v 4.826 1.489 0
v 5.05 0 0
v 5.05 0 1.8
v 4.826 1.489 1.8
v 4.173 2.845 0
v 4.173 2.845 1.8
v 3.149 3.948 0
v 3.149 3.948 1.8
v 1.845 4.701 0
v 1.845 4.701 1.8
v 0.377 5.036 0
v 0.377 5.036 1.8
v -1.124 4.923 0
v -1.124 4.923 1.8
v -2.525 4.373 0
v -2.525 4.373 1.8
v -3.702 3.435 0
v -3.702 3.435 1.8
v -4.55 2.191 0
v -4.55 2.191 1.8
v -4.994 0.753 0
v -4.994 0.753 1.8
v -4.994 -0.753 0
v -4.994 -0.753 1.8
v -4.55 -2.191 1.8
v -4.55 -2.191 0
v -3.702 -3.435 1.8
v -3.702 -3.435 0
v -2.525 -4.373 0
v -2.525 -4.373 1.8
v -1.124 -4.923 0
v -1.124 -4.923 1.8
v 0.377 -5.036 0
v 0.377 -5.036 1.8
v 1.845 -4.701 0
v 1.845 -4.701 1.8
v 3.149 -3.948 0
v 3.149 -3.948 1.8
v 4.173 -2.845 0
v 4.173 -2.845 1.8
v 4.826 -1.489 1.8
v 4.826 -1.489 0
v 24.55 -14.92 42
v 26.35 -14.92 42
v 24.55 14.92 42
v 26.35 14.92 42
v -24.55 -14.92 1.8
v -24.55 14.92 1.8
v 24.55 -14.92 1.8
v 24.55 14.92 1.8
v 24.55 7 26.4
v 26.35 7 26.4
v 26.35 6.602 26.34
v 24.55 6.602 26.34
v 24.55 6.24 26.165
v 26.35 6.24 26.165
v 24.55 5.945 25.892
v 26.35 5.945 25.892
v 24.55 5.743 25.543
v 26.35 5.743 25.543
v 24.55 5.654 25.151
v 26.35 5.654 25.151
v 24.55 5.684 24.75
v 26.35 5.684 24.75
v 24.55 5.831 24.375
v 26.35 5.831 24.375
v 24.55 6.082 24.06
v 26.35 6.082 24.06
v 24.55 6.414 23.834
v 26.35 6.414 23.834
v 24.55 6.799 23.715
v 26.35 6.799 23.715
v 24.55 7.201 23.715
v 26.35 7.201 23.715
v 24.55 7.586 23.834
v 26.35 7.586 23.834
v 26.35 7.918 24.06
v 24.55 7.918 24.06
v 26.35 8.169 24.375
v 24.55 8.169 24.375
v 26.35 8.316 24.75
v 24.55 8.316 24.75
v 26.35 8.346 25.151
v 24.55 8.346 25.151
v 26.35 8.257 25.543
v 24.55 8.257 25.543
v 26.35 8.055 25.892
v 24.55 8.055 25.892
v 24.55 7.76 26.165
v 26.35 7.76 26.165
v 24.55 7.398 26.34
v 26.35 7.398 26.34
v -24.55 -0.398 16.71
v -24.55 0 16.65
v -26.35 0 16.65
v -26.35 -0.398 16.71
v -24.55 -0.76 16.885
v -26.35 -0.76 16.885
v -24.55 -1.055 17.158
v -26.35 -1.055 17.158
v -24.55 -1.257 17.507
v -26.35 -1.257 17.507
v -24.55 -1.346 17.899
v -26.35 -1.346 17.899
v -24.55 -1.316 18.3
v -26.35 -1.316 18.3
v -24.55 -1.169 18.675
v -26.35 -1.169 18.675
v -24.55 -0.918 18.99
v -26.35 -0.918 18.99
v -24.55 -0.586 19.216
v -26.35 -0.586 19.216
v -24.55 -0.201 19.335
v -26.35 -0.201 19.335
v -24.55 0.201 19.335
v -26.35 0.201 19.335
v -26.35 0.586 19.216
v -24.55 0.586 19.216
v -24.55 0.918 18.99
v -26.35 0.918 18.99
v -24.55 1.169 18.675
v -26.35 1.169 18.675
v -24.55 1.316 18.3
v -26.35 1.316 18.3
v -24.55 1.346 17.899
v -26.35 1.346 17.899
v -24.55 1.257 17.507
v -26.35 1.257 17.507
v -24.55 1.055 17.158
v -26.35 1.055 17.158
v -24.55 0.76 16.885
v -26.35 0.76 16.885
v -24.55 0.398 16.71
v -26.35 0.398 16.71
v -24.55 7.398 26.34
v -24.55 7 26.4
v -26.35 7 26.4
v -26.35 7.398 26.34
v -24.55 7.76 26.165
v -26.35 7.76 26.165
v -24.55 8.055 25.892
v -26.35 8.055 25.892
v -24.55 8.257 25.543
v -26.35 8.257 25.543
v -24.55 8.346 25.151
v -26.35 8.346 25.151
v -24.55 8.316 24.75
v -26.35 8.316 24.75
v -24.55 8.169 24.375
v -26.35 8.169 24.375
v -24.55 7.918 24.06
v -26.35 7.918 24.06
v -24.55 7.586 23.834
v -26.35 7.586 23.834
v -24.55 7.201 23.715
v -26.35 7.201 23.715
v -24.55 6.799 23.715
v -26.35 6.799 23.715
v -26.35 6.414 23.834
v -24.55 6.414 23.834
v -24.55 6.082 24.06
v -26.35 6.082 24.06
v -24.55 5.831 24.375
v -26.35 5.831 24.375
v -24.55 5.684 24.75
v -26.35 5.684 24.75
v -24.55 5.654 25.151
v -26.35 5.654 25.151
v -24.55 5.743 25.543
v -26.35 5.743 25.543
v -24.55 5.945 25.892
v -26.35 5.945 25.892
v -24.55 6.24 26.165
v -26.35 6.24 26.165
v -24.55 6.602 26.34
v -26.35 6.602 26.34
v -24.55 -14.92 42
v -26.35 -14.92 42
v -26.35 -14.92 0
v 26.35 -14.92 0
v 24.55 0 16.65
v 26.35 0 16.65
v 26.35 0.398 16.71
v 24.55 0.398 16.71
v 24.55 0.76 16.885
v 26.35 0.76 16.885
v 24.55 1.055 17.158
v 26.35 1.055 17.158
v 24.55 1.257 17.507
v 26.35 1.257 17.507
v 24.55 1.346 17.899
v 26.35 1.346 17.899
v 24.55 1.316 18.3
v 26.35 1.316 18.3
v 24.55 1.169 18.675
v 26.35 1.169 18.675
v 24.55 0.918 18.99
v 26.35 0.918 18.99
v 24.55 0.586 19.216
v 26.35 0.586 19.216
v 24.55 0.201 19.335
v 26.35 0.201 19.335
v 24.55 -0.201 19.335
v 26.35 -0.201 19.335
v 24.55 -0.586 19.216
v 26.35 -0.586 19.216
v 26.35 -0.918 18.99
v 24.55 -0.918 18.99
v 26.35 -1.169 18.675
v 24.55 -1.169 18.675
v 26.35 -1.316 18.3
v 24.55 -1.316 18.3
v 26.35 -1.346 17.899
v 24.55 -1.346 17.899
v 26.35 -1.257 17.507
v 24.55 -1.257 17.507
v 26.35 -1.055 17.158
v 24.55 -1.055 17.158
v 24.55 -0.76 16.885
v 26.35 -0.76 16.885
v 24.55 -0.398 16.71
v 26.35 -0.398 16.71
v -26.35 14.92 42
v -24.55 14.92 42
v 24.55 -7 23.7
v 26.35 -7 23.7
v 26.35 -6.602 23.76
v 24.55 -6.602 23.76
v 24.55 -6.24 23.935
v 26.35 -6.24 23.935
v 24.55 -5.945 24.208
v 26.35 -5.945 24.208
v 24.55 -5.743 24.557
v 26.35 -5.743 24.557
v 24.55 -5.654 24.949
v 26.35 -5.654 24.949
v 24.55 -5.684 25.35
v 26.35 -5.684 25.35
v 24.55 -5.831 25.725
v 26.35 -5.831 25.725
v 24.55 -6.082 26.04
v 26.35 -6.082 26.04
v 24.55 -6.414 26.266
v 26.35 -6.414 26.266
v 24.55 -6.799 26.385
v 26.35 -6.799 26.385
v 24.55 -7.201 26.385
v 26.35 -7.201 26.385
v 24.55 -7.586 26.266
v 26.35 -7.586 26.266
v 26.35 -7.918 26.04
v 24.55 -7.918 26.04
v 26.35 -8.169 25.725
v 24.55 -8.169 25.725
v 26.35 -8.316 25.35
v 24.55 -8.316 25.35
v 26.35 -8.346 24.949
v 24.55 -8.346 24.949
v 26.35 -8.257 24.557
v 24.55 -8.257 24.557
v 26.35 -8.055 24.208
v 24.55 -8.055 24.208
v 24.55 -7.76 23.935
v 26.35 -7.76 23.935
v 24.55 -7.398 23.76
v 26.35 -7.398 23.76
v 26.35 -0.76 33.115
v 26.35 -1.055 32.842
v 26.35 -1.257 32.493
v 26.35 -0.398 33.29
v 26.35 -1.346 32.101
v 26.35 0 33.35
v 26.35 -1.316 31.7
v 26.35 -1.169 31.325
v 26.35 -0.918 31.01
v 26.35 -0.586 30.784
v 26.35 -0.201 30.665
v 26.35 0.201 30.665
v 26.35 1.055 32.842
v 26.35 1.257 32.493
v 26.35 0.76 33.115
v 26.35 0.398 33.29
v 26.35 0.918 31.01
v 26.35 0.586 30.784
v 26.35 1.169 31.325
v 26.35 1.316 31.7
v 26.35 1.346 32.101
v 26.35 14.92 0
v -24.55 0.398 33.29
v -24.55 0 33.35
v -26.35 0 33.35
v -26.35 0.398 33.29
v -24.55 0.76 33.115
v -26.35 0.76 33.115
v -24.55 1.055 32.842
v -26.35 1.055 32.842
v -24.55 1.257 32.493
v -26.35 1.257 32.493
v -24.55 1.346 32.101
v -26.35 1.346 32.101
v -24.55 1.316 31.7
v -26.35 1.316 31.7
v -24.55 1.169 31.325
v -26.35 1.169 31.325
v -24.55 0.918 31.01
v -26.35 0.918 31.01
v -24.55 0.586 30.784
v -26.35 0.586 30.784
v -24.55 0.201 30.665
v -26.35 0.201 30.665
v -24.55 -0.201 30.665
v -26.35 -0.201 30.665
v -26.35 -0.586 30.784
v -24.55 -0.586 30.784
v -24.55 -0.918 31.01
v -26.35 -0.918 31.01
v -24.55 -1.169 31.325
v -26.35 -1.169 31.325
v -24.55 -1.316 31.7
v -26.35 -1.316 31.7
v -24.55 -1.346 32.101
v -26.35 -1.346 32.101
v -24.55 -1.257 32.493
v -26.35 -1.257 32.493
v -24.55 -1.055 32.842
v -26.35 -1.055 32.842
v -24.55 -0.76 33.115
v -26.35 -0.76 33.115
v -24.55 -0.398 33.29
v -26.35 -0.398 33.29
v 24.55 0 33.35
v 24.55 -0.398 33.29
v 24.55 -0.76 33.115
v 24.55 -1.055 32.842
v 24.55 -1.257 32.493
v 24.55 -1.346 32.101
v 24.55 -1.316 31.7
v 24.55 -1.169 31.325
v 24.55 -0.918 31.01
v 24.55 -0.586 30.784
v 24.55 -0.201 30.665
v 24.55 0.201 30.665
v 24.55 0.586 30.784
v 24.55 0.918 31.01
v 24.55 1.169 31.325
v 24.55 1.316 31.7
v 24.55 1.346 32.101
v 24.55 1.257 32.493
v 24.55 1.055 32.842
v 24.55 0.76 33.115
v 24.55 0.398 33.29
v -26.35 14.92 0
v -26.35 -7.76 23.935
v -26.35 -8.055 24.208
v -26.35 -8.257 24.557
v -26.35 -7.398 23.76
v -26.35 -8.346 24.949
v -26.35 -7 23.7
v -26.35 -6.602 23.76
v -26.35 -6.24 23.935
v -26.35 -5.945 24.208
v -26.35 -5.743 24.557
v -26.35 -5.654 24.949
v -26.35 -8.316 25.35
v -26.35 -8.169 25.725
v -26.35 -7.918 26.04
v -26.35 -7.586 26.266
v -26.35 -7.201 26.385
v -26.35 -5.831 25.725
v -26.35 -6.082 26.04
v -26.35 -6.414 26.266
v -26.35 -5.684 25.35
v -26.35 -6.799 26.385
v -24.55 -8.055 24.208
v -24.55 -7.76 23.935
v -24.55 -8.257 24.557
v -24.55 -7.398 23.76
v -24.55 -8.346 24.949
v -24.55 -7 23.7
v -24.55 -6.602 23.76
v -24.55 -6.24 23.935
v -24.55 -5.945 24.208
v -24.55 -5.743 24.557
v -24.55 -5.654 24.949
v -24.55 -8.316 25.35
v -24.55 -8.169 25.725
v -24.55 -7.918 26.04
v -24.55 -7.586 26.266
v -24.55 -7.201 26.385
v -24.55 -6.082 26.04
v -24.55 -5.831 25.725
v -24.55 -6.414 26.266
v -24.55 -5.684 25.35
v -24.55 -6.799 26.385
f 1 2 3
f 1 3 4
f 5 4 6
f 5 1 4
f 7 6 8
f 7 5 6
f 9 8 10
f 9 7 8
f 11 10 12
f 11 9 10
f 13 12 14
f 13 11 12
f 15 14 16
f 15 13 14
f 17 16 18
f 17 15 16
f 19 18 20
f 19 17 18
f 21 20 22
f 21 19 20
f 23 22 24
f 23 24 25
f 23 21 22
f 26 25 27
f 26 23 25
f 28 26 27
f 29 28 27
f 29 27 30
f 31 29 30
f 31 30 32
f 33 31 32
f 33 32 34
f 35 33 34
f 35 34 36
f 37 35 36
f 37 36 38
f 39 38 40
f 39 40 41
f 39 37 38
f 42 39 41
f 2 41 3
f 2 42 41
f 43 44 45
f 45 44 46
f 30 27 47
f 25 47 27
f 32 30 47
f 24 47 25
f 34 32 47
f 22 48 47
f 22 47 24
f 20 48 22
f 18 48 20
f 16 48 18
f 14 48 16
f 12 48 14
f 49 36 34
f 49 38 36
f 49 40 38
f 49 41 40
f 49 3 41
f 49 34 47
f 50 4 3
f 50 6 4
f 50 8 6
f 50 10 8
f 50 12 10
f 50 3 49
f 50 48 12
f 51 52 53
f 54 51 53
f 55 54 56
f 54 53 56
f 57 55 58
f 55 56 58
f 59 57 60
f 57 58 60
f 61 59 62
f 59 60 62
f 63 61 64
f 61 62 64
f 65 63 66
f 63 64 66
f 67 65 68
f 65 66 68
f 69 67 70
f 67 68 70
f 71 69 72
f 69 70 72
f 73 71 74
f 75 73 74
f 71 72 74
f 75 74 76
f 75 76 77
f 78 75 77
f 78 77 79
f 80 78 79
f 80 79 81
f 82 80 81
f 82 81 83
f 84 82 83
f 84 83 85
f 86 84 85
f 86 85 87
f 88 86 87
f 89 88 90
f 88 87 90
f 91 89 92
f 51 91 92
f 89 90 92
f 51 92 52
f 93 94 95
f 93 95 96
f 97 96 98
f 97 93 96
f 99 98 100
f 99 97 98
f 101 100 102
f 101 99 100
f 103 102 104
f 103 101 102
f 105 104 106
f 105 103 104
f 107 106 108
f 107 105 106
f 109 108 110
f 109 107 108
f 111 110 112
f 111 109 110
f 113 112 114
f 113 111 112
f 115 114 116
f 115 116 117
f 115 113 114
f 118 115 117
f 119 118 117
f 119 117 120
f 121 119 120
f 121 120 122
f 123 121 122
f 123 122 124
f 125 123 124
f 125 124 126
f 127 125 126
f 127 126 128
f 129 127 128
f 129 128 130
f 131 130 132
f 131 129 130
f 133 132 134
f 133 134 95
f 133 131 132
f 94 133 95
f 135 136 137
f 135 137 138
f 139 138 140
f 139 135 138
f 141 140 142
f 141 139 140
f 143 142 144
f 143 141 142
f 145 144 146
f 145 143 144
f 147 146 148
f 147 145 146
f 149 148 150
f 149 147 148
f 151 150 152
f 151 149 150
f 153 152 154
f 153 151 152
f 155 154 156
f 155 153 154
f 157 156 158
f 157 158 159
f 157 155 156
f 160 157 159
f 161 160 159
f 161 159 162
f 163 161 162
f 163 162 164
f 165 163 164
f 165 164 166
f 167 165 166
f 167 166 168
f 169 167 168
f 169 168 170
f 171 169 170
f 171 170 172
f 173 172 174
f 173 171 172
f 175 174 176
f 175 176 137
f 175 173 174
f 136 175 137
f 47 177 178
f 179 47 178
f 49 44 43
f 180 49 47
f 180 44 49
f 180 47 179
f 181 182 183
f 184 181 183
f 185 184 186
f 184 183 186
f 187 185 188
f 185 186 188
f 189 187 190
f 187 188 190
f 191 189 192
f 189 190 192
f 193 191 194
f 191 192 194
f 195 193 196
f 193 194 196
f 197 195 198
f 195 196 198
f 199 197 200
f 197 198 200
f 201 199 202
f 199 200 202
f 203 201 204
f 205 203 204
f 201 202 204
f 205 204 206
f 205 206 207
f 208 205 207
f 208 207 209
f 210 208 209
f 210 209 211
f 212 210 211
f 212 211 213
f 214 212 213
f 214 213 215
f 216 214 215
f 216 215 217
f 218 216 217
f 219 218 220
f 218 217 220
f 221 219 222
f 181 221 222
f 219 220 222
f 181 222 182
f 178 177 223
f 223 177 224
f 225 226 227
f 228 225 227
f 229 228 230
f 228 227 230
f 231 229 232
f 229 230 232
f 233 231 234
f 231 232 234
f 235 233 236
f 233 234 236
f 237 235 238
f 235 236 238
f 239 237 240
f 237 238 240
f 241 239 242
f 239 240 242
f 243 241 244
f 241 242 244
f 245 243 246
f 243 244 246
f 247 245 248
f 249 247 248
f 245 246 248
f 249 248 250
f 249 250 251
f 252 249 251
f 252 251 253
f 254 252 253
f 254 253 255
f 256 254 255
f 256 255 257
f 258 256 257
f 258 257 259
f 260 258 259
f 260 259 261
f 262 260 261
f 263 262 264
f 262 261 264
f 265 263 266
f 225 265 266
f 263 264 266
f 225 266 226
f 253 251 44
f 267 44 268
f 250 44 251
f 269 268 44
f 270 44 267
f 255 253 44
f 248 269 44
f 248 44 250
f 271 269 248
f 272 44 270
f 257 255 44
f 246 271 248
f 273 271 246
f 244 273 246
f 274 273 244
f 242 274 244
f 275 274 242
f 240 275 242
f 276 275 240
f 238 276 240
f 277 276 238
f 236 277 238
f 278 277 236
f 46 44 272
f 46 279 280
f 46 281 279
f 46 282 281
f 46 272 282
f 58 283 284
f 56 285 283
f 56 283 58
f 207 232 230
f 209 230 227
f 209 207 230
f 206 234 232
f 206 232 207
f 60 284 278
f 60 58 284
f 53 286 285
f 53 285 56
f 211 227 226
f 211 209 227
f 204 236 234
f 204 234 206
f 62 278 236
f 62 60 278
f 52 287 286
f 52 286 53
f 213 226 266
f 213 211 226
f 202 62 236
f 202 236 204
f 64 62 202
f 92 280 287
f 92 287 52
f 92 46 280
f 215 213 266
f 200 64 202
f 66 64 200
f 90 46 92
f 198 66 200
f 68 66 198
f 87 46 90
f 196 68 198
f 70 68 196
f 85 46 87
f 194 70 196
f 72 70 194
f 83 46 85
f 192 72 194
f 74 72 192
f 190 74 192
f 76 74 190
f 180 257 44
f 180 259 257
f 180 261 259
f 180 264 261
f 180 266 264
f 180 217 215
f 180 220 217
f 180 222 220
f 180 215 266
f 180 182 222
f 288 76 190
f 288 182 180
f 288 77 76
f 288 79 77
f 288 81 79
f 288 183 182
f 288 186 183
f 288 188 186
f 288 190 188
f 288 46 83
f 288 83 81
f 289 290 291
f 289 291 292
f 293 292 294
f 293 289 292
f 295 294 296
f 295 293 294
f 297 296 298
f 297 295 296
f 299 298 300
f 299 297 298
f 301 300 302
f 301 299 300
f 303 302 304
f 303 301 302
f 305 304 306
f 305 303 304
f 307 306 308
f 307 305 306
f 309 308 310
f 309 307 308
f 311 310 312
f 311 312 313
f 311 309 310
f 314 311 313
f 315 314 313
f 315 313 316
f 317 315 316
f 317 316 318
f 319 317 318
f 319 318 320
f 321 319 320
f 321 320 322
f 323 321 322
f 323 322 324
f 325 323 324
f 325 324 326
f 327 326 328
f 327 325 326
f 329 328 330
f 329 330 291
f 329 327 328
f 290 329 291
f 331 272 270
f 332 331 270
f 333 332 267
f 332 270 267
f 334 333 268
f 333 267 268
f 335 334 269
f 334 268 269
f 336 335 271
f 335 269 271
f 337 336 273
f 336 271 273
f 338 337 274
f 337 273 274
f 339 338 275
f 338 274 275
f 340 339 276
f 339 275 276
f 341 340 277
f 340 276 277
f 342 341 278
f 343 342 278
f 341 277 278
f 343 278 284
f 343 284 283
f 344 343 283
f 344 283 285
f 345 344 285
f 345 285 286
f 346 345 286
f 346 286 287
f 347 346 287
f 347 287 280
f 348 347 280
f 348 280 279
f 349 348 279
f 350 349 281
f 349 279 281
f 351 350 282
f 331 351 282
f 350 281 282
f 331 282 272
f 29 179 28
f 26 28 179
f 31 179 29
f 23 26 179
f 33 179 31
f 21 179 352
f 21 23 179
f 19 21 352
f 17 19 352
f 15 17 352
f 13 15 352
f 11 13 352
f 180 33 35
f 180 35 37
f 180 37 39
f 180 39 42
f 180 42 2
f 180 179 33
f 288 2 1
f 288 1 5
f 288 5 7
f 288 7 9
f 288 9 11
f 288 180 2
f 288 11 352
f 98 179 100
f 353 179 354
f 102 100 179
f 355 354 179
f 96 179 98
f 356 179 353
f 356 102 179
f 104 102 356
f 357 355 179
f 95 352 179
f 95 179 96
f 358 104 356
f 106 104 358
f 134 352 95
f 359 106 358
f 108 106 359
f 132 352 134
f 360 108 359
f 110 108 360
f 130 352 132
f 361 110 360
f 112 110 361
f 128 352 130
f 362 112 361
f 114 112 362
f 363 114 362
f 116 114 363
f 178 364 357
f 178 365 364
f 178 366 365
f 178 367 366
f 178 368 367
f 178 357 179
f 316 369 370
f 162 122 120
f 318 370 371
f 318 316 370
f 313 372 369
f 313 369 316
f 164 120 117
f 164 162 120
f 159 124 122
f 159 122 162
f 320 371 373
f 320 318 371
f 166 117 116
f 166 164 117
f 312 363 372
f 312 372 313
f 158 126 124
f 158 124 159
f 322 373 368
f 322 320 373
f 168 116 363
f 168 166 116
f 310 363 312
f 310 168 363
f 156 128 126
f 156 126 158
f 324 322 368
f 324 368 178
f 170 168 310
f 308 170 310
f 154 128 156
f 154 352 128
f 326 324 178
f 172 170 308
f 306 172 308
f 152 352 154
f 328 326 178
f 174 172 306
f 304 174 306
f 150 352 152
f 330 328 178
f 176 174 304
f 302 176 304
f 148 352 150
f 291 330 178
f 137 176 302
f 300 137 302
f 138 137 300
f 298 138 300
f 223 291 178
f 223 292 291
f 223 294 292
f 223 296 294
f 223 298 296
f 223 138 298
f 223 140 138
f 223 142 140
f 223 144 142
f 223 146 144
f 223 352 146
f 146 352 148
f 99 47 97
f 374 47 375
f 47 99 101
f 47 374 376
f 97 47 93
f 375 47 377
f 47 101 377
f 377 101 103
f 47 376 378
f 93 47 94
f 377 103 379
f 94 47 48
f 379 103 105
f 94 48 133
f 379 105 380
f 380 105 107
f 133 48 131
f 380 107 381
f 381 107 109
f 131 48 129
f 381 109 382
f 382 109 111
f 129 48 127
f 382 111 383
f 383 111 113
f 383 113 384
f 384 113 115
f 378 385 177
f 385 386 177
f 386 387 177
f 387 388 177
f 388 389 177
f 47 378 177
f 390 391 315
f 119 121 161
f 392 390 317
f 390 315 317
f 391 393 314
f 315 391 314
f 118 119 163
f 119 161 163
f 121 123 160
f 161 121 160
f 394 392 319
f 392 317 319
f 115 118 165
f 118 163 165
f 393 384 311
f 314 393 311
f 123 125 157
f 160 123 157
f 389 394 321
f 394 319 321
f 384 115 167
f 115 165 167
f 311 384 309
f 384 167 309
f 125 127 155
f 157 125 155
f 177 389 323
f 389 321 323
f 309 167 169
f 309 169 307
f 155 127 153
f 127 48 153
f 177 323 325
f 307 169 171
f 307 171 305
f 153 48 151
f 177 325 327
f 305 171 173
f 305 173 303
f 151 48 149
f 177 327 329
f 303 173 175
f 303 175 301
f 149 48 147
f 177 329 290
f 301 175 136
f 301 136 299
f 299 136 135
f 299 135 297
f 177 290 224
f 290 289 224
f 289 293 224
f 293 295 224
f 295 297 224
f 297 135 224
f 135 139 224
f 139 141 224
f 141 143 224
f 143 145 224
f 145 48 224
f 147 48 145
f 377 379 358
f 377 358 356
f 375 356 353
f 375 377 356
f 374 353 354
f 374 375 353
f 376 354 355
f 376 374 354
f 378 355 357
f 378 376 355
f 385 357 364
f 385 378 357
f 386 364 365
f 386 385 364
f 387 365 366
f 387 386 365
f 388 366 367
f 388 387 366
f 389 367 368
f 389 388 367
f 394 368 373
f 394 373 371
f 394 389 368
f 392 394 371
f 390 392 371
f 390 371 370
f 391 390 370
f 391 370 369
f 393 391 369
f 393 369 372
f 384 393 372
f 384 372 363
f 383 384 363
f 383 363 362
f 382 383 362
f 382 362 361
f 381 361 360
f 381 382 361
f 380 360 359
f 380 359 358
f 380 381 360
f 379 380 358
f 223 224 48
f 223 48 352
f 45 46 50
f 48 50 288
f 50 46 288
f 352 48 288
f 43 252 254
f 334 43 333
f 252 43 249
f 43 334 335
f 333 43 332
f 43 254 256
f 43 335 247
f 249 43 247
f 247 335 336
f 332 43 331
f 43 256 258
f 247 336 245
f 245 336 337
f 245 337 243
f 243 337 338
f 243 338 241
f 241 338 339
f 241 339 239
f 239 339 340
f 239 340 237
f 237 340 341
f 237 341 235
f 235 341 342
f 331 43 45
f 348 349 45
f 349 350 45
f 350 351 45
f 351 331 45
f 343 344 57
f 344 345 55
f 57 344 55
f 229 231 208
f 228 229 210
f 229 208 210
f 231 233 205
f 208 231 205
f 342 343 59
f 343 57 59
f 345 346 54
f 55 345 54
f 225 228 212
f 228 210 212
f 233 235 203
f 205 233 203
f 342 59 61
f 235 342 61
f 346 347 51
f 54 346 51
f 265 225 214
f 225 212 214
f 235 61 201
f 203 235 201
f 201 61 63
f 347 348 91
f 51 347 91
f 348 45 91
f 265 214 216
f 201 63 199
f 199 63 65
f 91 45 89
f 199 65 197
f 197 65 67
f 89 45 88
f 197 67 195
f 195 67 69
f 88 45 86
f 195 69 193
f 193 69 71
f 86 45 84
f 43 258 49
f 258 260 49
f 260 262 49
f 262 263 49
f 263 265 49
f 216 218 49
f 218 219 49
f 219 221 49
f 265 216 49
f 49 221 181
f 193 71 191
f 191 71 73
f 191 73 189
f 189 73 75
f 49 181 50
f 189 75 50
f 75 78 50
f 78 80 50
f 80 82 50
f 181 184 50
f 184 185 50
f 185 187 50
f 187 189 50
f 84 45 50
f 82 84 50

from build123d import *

# Parameters (mm, degrees)
ESBO_O1_W                = 49.1
ESBO_O1_H                = 29.84
ESBO_O1_R                = 5.05
RESSALTO_EXTRUS_O1_DEPTH = 1.8
ESBO_O2_W                = 42
ESBO_O2_H                = 29.84
ESBO_O2_R                = 1.35
RESSALTO_EXTRUS_O2_DEPTH = 1.8
RESSALTO_EXTRUS_O3_START = 1.8
ESBO_O3_W                = 42
ESBO_O3_H                = 29.84
ESBO_O3_R                = 1.35
RESSALTO_EXTRUS_O3_DEPTH = 1.8


with BuildPart() as part:
    # Esboço1 → Ressalto-extrusão1 (new body)
    with BuildSketch(Plane.XY):
        Rectangle(ESBO_O1_W, ESBO_O1_H)
        Circle(ESBO_O1_R, mode=Mode.SUBTRACT)
    extrude(amount=RESSALTO_EXTRUS_O1_DEPTH)

    # Esboço2 → Ressalto-extrusão2 (add)
    with BuildSketch(Plane.ZY.offset(24.55)):
        with Locations((21, 0)):
            Rectangle(ESBO_O2_W, ESBO_O2_H)
        with Locations((32, 0)):
            Circle(ESBO_O2_R, mode=Mode.SUBTRACT)
        with Locations((25.05, 7)):
            Circle(ESBO_O2_R, mode=Mode.SUBTRACT)
        with Locations(Location((18, 0, 0), (0, 0, 180))):
            Circle(ESBO_O2_R, mode=Mode.SUBTRACT)
        with Locations(Location((25.05, -7, 0), (0, 0, 180))):
            Circle(ESBO_O2_R, mode=Mode.SUBTRACT)
    extrude(amount=RESSALTO_EXTRUS_O2_DEPTH)

    # Esboço3 → Ressalto-extrusão3 (add)
    with BuildSketch(Plane(origin=(24.55, 0, 0), x_dir=(0, 0, -1), z_dir=(1, 0, 0)).offset(RESSALTO_EXTRUS_O3_START)):
        with Locations((-21, 0)):
            Rectangle(ESBO_O3_W, ESBO_O3_H)
        with Locations(Location((-25.05, 7, 0), (0, 0, 180))):
            Circle(ESBO_O3_R, mode=Mode.SUBTRACT)
        with Locations((-18, 0)):
            Circle(ESBO_O3_R, mode=Mode.SUBTRACT)
        with Locations(Location((-32, 0, 0), (0, 0, 180))):
            Circle(ESBO_O3_R, mode=Mode.SUBTRACT)
        with Locations((-25.05, -7)):
            Circle(ESBO_O3_R, mode=Mode.SUBTRACT)
    extrude(amount=-RESSALTO_EXTRUS_O3_DEPTH)


solid = part.part
